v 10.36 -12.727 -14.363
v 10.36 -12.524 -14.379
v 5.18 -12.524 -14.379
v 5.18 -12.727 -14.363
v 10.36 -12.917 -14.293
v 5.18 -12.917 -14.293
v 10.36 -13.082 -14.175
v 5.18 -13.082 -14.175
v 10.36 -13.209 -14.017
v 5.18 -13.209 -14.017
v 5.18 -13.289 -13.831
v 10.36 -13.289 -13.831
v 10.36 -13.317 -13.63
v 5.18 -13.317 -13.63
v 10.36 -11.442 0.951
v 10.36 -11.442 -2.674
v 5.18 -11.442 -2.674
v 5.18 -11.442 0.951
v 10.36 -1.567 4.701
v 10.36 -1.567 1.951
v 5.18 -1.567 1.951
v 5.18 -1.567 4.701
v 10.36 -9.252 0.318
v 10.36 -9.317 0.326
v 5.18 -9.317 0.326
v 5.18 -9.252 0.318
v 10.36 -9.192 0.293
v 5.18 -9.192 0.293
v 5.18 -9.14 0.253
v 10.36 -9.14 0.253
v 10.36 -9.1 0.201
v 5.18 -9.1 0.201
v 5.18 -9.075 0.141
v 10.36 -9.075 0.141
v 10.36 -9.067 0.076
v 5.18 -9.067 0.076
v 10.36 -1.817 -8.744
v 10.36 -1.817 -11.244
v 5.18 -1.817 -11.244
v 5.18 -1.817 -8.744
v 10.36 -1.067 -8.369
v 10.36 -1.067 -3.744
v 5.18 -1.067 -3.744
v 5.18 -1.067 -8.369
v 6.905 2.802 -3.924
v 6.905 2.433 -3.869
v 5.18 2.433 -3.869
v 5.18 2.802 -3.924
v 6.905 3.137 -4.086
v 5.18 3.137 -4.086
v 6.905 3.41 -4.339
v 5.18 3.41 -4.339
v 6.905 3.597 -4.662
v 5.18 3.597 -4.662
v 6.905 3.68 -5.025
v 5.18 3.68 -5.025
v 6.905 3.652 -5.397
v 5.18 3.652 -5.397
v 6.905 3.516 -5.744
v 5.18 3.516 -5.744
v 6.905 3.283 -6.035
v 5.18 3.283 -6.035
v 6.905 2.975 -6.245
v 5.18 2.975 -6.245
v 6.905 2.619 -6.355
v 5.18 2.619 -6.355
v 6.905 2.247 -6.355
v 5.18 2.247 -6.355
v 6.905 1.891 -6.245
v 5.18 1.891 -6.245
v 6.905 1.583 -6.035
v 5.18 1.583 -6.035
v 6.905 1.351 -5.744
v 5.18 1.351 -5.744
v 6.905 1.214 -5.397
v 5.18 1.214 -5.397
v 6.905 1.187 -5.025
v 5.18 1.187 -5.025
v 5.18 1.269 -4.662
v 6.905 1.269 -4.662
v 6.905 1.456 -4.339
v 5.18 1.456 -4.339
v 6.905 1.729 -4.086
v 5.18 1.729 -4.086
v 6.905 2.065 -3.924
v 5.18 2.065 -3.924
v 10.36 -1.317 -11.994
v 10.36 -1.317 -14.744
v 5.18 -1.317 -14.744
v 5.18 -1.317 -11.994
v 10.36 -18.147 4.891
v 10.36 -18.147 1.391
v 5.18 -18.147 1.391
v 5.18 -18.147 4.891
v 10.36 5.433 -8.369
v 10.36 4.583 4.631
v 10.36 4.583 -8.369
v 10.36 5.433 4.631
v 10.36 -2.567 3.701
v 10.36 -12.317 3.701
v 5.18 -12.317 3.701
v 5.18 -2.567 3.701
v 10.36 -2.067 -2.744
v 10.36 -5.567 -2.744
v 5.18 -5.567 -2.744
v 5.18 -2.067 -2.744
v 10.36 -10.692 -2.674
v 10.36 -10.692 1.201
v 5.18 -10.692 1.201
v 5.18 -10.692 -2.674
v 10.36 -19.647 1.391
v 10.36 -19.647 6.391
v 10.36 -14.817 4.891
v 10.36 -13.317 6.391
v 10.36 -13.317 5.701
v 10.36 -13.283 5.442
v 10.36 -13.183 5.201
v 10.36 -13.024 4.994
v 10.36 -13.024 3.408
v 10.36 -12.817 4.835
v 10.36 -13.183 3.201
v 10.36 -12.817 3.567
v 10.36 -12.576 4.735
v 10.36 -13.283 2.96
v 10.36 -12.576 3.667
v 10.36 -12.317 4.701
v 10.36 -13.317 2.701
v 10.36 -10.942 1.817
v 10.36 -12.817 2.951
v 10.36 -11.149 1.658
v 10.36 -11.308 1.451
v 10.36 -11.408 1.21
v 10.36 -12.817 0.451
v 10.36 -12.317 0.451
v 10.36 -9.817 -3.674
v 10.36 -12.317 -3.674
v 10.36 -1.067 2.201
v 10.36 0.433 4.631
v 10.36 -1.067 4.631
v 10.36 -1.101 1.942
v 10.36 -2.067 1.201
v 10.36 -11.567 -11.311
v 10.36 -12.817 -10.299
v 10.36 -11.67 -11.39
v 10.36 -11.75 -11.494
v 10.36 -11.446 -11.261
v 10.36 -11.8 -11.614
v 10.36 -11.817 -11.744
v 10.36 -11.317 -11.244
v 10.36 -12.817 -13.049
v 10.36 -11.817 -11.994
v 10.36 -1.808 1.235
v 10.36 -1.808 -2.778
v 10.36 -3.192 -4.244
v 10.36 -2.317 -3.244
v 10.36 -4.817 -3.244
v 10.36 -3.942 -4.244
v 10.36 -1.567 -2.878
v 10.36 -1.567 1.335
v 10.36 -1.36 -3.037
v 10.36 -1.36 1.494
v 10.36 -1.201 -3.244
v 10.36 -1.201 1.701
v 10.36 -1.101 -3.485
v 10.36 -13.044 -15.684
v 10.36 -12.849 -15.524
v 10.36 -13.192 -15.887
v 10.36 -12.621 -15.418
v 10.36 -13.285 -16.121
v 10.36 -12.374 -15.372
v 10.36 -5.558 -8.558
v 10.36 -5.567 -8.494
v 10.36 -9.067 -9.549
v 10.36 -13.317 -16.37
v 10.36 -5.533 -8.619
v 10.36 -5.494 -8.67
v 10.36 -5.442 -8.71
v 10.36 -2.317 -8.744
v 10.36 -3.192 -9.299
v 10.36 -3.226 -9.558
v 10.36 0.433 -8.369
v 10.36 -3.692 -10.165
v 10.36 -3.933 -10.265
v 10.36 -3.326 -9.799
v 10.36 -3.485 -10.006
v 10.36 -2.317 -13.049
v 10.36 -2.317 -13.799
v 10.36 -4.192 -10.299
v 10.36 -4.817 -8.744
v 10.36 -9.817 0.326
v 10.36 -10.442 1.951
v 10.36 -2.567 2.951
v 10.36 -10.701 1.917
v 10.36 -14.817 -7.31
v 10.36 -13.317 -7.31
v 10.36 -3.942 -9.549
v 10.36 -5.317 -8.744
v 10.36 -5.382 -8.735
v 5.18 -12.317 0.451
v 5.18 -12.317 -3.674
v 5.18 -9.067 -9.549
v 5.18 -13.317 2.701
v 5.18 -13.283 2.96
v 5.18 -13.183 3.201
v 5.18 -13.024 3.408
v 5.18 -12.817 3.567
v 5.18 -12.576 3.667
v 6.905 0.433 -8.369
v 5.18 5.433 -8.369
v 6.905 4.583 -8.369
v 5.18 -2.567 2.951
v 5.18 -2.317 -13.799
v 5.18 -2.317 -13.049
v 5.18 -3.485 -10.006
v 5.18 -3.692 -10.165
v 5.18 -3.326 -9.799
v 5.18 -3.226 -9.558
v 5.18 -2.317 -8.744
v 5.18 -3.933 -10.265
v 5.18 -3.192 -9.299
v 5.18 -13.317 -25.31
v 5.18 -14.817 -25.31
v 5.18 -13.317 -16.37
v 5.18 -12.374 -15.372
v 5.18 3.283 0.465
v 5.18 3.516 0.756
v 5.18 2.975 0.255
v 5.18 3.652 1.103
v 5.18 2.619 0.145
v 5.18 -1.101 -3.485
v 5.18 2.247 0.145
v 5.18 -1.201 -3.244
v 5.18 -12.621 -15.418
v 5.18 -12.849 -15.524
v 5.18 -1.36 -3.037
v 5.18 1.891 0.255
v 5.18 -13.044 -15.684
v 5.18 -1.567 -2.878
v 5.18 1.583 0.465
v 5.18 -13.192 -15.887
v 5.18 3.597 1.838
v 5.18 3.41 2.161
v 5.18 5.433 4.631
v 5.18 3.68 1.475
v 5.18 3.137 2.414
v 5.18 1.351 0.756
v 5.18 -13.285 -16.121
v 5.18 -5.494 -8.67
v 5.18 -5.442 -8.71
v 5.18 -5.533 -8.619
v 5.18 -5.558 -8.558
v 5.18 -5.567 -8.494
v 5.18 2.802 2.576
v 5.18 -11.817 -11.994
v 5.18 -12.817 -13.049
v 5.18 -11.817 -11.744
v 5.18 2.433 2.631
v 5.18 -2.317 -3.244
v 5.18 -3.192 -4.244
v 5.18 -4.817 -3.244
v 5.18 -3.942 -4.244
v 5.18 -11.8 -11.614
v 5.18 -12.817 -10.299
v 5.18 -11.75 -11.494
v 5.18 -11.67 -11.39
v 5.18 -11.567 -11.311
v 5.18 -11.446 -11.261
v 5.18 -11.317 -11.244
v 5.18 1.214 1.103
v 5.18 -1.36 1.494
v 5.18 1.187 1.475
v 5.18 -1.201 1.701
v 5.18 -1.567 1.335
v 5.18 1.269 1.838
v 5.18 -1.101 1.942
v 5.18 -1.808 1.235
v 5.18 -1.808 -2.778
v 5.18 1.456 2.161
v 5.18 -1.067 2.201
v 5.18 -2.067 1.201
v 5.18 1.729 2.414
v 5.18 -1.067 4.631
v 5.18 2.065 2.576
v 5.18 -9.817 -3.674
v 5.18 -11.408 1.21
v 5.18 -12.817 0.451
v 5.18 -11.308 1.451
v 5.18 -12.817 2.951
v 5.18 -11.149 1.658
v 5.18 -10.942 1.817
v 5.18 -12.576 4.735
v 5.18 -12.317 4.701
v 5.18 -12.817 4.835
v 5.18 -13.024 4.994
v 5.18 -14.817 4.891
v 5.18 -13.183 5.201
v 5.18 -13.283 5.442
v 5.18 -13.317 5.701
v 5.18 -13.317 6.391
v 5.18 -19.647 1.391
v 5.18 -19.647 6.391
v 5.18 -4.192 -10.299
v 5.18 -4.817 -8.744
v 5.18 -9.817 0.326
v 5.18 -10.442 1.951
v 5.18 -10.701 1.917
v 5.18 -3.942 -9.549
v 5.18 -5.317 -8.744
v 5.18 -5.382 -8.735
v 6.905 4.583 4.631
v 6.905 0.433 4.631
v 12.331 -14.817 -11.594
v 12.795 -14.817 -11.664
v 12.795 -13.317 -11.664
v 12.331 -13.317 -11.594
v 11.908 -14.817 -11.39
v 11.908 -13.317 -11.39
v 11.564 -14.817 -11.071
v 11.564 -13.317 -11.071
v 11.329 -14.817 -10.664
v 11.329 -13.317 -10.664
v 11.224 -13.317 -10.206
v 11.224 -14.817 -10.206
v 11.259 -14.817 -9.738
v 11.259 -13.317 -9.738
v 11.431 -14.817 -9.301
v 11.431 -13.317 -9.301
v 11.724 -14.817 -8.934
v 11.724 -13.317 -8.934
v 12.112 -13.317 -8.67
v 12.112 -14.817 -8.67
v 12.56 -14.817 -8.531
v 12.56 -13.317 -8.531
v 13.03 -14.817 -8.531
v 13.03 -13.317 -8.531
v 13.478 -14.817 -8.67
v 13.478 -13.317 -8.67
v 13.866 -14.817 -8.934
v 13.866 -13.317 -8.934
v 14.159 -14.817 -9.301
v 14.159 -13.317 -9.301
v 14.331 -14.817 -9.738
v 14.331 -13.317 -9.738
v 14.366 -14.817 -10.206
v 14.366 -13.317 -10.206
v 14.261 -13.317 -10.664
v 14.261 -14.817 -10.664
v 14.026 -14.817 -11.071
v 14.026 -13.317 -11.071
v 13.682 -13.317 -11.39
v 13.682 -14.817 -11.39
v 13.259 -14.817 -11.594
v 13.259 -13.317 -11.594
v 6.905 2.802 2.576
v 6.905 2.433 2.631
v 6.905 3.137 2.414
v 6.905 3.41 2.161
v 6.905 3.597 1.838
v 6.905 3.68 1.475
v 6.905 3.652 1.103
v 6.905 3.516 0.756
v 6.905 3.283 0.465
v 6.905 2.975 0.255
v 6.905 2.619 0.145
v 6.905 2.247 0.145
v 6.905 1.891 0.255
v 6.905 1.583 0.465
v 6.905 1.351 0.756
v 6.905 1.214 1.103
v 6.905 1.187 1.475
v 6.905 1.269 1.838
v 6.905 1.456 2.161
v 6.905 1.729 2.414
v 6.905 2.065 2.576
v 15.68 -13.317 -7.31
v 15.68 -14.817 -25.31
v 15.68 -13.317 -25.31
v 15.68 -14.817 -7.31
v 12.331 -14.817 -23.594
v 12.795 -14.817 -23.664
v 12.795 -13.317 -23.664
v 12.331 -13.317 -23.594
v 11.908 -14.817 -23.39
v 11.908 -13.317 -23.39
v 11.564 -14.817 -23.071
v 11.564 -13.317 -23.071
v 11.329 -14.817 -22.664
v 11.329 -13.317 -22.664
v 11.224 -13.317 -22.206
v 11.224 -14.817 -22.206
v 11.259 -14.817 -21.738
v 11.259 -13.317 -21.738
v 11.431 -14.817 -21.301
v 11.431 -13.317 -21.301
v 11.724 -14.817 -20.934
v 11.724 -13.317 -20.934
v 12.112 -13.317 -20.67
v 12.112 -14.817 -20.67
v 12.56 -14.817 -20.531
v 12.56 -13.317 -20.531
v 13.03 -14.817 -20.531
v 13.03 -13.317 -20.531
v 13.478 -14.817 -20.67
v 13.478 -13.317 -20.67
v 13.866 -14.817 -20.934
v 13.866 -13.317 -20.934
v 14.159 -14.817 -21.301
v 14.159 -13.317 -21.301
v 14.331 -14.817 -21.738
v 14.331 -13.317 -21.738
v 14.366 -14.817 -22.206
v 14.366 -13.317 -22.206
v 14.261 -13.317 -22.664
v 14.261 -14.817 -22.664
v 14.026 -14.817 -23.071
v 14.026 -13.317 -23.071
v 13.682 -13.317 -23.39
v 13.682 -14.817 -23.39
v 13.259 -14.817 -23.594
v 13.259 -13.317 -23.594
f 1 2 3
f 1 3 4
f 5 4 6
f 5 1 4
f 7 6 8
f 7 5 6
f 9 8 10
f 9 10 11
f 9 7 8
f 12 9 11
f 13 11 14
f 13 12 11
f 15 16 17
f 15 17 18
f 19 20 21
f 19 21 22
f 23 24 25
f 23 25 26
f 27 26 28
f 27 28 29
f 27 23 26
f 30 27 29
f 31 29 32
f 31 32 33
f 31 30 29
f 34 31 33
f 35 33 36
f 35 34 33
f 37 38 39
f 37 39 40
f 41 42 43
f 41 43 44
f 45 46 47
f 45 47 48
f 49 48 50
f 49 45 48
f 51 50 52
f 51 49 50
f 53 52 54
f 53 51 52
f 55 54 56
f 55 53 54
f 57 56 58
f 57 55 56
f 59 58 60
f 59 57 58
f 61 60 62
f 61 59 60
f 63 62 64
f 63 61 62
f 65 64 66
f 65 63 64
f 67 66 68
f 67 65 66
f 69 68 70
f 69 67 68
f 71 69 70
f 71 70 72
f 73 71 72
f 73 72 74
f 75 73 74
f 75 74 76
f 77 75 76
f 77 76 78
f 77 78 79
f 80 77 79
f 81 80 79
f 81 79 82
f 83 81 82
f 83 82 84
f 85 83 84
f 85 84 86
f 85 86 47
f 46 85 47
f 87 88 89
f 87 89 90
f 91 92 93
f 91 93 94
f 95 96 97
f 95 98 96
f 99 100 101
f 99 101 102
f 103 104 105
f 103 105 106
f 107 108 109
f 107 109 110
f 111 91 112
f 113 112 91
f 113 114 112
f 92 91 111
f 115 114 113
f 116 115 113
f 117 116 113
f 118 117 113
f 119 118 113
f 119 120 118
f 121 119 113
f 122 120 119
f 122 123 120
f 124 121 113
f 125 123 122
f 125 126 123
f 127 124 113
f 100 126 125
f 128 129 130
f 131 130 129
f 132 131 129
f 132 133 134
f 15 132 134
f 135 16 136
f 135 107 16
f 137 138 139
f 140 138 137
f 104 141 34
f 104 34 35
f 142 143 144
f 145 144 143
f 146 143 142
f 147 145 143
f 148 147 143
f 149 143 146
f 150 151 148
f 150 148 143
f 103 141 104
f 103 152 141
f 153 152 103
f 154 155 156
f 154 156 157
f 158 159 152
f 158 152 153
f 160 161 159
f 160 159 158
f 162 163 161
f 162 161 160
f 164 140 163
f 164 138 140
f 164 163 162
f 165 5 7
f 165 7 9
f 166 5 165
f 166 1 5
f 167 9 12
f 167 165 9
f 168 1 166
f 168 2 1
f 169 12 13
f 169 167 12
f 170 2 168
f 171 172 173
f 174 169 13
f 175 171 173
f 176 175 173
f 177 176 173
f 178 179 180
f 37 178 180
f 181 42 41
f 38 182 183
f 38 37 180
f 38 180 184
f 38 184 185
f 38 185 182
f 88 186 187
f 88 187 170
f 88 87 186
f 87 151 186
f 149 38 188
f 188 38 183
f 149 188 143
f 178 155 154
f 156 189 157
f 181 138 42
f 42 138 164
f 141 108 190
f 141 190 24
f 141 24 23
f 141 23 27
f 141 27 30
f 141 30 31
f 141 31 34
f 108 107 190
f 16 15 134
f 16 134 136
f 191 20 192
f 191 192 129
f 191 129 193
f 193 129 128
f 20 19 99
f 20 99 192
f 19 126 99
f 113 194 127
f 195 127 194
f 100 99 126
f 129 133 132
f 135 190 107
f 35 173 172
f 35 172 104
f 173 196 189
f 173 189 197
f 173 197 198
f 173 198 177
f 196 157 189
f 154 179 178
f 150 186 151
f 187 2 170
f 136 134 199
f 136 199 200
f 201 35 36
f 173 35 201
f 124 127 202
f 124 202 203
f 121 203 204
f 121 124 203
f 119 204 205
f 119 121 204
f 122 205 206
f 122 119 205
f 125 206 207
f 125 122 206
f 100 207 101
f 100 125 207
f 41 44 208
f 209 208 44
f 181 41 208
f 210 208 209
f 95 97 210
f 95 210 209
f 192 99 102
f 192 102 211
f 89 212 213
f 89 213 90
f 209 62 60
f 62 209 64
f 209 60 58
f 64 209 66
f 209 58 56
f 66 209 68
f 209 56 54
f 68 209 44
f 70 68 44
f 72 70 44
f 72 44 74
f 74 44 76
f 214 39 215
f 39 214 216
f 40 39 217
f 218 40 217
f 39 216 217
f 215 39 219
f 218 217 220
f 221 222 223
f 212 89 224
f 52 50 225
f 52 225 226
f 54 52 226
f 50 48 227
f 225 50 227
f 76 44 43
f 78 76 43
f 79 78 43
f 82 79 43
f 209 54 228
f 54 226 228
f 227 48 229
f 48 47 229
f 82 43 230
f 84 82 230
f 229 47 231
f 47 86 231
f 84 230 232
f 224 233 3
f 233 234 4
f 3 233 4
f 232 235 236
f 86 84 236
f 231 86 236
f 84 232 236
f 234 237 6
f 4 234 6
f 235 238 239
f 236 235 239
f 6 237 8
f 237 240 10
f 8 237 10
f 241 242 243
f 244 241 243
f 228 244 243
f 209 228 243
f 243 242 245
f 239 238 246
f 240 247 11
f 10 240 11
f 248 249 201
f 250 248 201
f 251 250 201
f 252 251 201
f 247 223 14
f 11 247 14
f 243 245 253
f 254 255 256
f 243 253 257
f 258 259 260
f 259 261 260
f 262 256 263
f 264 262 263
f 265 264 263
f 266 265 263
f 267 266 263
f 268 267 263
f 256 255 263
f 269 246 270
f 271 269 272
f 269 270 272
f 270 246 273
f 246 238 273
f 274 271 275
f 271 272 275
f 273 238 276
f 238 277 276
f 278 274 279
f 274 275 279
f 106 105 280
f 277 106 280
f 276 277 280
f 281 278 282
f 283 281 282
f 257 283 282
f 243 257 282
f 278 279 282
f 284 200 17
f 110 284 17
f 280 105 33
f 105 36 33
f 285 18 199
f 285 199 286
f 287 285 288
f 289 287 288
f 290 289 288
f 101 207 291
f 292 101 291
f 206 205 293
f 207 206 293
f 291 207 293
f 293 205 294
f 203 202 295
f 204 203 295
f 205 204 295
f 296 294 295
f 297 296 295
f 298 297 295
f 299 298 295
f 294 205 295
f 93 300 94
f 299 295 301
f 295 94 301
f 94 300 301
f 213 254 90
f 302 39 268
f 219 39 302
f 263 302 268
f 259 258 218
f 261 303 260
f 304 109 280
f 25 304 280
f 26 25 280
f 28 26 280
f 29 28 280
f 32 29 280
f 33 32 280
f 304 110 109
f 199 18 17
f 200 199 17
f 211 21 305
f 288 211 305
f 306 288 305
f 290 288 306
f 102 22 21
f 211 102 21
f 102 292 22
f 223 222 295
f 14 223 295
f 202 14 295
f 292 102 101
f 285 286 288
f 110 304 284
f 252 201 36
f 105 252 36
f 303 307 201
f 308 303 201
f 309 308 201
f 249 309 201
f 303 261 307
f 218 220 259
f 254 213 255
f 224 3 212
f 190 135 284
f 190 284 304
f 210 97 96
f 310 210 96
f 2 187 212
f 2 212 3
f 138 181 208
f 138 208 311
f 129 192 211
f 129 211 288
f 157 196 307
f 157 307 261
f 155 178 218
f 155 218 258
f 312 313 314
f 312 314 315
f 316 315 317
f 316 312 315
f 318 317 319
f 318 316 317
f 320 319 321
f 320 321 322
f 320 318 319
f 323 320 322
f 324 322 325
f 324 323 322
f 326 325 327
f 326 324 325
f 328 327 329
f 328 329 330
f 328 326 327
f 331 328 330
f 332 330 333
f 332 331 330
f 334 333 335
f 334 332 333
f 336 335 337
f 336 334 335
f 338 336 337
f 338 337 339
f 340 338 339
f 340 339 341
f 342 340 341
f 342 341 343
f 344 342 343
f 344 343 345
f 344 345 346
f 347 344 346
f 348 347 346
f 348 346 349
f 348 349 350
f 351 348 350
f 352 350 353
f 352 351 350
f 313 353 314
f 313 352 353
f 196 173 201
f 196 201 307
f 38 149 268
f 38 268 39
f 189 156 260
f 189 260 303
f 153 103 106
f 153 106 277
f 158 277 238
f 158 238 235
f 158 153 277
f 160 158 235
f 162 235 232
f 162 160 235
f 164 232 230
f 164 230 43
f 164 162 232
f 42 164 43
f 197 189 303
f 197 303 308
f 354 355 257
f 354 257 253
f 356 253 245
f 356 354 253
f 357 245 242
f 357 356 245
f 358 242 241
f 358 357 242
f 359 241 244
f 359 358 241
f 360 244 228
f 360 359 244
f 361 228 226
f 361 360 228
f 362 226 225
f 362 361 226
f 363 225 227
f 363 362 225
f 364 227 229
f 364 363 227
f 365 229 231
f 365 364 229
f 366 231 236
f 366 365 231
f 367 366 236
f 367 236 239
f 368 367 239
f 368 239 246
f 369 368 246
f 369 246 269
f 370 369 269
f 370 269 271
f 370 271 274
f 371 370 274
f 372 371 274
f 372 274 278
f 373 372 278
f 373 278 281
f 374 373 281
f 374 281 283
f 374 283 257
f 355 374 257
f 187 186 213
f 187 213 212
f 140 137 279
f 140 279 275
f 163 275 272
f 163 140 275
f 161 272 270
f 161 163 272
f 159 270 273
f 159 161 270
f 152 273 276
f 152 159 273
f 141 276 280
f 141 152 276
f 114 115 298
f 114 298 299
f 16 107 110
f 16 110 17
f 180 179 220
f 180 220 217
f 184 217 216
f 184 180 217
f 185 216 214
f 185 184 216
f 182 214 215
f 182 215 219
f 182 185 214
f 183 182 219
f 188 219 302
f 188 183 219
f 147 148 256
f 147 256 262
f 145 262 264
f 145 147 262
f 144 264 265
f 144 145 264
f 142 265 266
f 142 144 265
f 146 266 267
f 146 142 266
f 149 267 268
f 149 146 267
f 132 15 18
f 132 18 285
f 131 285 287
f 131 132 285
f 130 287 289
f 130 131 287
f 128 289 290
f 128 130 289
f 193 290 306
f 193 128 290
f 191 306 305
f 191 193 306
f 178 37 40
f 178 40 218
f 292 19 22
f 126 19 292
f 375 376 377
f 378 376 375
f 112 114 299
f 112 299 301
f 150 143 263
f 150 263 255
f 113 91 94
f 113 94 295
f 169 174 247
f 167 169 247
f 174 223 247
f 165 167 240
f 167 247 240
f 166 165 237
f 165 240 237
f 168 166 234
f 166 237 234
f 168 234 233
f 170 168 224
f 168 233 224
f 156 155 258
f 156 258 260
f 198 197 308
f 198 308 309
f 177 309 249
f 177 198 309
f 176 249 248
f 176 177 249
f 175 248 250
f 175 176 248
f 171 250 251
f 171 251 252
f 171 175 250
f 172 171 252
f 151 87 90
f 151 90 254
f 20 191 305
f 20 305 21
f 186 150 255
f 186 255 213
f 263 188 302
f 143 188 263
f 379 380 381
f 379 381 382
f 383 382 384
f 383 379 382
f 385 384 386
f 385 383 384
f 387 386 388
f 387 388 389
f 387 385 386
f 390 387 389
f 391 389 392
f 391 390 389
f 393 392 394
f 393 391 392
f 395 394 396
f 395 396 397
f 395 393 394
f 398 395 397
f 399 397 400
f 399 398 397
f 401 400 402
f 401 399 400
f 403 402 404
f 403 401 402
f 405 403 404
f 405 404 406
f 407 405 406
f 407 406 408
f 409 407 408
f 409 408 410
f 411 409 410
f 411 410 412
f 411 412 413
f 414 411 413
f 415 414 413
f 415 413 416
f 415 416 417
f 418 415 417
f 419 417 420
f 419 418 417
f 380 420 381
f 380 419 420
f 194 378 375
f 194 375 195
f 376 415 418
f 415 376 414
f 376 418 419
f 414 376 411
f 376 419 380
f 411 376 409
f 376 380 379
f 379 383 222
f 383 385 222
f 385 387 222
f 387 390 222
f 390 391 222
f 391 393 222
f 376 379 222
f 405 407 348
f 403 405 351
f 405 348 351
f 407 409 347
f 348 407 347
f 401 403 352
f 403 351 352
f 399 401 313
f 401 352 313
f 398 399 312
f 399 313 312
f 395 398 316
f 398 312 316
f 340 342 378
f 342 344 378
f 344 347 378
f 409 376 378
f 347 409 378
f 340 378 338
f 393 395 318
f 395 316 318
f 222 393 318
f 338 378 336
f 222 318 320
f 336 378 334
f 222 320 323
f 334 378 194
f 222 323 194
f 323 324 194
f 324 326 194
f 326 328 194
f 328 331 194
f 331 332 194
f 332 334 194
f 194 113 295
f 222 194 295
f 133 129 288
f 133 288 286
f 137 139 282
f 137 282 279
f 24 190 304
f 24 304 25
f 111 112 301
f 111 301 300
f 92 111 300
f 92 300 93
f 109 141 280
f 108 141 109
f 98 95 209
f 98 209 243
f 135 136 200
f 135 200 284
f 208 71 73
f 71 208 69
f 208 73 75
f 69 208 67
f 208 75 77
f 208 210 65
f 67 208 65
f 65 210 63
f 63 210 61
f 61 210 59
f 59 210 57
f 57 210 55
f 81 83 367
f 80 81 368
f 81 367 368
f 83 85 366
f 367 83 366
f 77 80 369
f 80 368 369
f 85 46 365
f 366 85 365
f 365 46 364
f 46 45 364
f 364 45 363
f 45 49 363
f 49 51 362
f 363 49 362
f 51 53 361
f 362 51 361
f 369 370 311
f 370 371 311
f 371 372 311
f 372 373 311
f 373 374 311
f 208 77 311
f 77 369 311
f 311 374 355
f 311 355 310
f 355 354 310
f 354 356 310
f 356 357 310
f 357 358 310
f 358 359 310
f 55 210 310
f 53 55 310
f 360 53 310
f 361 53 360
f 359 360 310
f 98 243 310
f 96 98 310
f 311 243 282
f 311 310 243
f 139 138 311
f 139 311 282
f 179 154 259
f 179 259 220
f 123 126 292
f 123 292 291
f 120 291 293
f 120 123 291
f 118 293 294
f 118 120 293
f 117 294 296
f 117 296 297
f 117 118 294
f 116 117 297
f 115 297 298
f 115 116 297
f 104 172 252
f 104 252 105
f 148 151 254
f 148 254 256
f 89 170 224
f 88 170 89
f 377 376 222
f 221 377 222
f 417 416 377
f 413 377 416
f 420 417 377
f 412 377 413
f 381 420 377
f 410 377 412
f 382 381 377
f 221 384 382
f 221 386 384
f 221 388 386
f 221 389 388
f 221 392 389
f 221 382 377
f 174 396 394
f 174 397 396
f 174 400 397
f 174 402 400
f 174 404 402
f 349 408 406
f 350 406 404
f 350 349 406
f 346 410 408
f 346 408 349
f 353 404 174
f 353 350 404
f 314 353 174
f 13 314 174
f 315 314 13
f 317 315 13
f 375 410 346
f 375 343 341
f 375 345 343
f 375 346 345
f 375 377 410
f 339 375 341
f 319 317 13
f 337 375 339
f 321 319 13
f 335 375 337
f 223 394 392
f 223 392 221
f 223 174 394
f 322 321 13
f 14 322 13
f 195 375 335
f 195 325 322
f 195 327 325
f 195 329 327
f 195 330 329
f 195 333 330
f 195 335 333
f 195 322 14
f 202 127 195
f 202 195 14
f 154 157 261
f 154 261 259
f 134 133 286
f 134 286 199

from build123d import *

# Parameters (mm, degrees)
FLEXURE_BOSS_DEPTH            = 5.18
SKETCH2_W                     = 10.5
SKETCH2_H                     = 18
SKETCH2_R                     = 1.575
MOUNTING_PLATE_BOSS_DEPTH     = 1.5
SKETCH7_W                     = 13
SKETCH7_H                     = 4.15
DOVETAIL_CONNECTION_CUT_DEPTH = 3.455
M3X0_5_TAPPED_HOLE1_D         = 2.5
FILLET1_R                     = 1


with BuildPart() as part:
    # Sketch1 → Flexure Boss (new body)
    with BuildSketch(Plane(origin=(0, 0, 0), x_dir=(0, 0, -1), z_dir=(1, 0, 0))):
        with BuildLine():
            ThreePointArc((2.743651747, -2.066915143), (3.036544966, -1.359808362), (3.743651747, -1.066915143))
            Line((3.743651747, -1.066915143), (8.368651984, -1.066915143))
            Line((8.368651984, -1.066915143), (8.368651984, 5.433084857))
            Line((8.368651984, 5.433084857), (-4.631348016, 5.433084857))
            Line((-4.631348016, 5.433084857), (-4.631348016, -1.066915143))
            Line((-4.631348016, -1.066915143), (-2.201142923, -1.066915143))
            ThreePointArc((-2.201142923, -1.066915143), (-1.494036142, -1.359808362), (-1.201142923, -2.066915143))
            Line((-1.201142923, -2.066915143), (-1.201142923, -10.691915143))
            Line((-1.201142923, -10.691915143), (2.673857314, -10.691915143))
            Line((2.673857314, -10.691915143), (2.673857314, -11.441915143))
            Line((2.673857314, -11.441915143), (-0.951142686, -11.441915143))
            ThreePointArc((-0.951142686, -11.441915143), (-1.658249467, -11.149021924), (-1.951142686, -10.441915143))
            Line((-1.951142686, -10.441915143), (-1.951142686, -1.566915143))
            Line((-1.951142686, -1.566915143), (-4.701142686, -1.566915143))
            Line((-4.701142686, -1.566915143), (-4.701142686, -12.316915143))
            ThreePointArc((-4.701142686, -12.316915143), (-4.994035905, -13.024021924), (-5.701142686, -13.316915143))
            Line((-5.701142686, -13.316915143), (-6.391348016, -13.316915143))
            Line((-6.391348016, -13.316915143), (-6.391348016, -19.646915143))
            Line((-6.391348016, -19.646915143), (-1.391348016, -19.646915143))
            Line((-1.391348016, -19.646915143), (-1.391348016, -18.146915143))
            Line((-1.391348016, -18.146915143), (-4.891348016, -18.146915143))
            Line((-4.891348016, -18.146915143), (-4.891348016, -14.816915143))
            Line((-4.891348016, -14.816915143), (-4.631348016, -14.816915143))
            Line((-4.631348016, -14.816915143), (15.425469929, -14.816915143))
            Line((15.425469929, -14.816915143), (15.425469929, -13.316915143))
            Line((15.425469929, -13.316915143), (14.743651747, -1.316915143))
            Line((14.743651747, -1.316915143), (11.993651747, -1.316915143))
            Line((11.993651747, -1.316915143), (11.993651747, -11.816915143))
            Line((11.993651747, -11.816915143), (11.743651747, -11.816915143))
            ThreePointArc((11.743651747, -11.816915143), (11.390098357, -11.670468534), (11.243651747, -11.316915143))
            Line((11.243651747, -11.316915143), (11.243651747, -1.816915143))
            Line((11.243651747, -1.816915143), (8.743651747, -1.816915143))
            Line((8.743651747, -1.816915143), (8.743651747, -2.316915143))
            Line((8.743651747, -2.316915143), (3.243651747, -2.316915143))
            Line((3.243651747, -2.316915143), (3.243651747, -4.816915143))
            Line((3.243651747, -4.816915143), (8.743651747, -4.816915143))
            Line((8.743651747, -4.816915143), (8.743651747, -5.316915143))
            ThreePointArc((8.743651747, -5.316915143), (8.670428443, -5.493691838), (8.493651747, -5.566915143))
            Line((8.493651747, -5.566915143), (2.743651747, -5.566915143))
            Line((2.743651747, -5.566915143), (2.743651747, -2.066915143))
        make_face()
        with BuildLine():
            ThreePointArc((-0.326142923, -9.316915143), (-0.252919618, -9.140138448), (-0.076142923, -9.066915143))
            Line((-0.076142923, -9.066915143), (9.548857077, -9.066915143))
            Line((9.548857077, -9.066915143), (9.548857077, -3.941915143))
            Line((9.548857077, -3.941915143), (4.243651747, -3.941915143))
            Line((4.243651747, -3.941915143), (4.243651747, -3.191915143))
            Line((4.243651747, -3.191915143), (9.298857077, -3.191915143))
            ThreePointArc((9.298857077, -3.191915143), (10.005963858, -3.484808362), (10.298857077, -4.191915143))
            Line((10.298857077, -4.191915143), (10.298857077, -12.816915143))
            Line((10.298857077, -12.816915143), (13.048857077, -12.816915143))
            Line((13.048857077, -12.816915143), (13.048857077, -2.316915143))
            Line((13.048857077, -2.316915143), (13.798857077, -2.316915143))
            Line((13.798857077, -2.316915143), (14.37882611, -12.524370125))
            ThreePointArc((14.37882611, -12.524370125), (14.175198347, -13.0819837), (13.630033801, -13.316915143))
            Line((13.630033801, -13.316915143), (-2.701142686, -13.316915143))
            ThreePointArc((-2.701142686, -13.316915143), (-3.408249467, -13.024021924), (-3.701142686, -12.316915143))
            Line((-3.701142686, -12.316915143), (-3.701142686, -2.566915143))
            Line((-3.701142686, -2.566915143), (-2.951142686, -2.566915143))
            Line((-2.951142686, -2.566915143), (-2.951142686, -12.816915143))
            Line((-2.951142686, -12.816915143), (-0.451142686, -12.816915143))
            Line((-0.451142686, -12.816915143), (-0.451142686, -12.316915143))
            Line((-0.451142686, -12.316915143), (3.673857314, -12.316915143))
            Line((3.673857314, -12.316915143), (3.673857314, -9.816915143))
            Line((3.673857314, -9.816915143), (-0.326142923, -9.816915143))
            Line((-0.326142923, -9.816915143), (-0.326142923, -9.316915143))
        make_face(mode=Mode.SUBTRACT)
    extrude(amount=FLEXURE_BOSS_DEPTH)

    # Sketch2 → Mounting Plate Boss (add)
    with BuildSketch(Plane.XZ.offset(14.816915143)):
        with Locations((-0.07, -16.309568548)):
            Rectangle(SKETCH2_W, SKETCH2_H)
        with Locations(Location((-2.435, -10.088651984, 0), (0, 0, 270))):
            Circle(SKETCH2_R, mode=Mode.SUBTRACT)
        with Locations(Location((-2.435, -22.088651984, 0), (0, 0, 270))):
            Circle(SKETCH2_R, mode=Mode.SUBTRACT)
    extrude(amount=-MOUNTING_PLATE_BOSS_DEPTH)

    # Sketch7 → Dovetail Connection Cut (cut)
    with BuildSketch(Plane.ZY):
        with Locations((-1.868651984, 2.508084857)):
            Rectangle(SKETCH7_W, SKETCH7_H)
    extrude(amount=-DOVETAIL_CONNECTION_CUT_DEPTH, mode=Mode.SUBTRACT)

    # M3x0.5 Tapped Hole1 (through all)
    with Locations(Plane(origin=(5.18, 0, 0), x_dir=(0, 0, -1), z_dir=(1, 0, 0))):
        with Locations((-1.381348016, 2.433084857), (5.118651984, 2.433084857)):
            Hole(M3X0_5_TAPPED_HOLE1_D / 2)


with BuildPart() as body_2:
    # Mirror2: mirrored copy
    add(part.part.mirror(Plane(origin=(5.18, 0, 0), x_dir=(0, 0, 1), z_dir=(1, 0, 0))))

    # Fillet1
    fillet1_edges = [body_2.edges().sort_by_distance(p)[0] for p in [
        (7.77, -13.316915143, -15.425469929),
    ]]
    fillet(fillet1_edges, radius=FILLET1_R)


solid = body_2.part
